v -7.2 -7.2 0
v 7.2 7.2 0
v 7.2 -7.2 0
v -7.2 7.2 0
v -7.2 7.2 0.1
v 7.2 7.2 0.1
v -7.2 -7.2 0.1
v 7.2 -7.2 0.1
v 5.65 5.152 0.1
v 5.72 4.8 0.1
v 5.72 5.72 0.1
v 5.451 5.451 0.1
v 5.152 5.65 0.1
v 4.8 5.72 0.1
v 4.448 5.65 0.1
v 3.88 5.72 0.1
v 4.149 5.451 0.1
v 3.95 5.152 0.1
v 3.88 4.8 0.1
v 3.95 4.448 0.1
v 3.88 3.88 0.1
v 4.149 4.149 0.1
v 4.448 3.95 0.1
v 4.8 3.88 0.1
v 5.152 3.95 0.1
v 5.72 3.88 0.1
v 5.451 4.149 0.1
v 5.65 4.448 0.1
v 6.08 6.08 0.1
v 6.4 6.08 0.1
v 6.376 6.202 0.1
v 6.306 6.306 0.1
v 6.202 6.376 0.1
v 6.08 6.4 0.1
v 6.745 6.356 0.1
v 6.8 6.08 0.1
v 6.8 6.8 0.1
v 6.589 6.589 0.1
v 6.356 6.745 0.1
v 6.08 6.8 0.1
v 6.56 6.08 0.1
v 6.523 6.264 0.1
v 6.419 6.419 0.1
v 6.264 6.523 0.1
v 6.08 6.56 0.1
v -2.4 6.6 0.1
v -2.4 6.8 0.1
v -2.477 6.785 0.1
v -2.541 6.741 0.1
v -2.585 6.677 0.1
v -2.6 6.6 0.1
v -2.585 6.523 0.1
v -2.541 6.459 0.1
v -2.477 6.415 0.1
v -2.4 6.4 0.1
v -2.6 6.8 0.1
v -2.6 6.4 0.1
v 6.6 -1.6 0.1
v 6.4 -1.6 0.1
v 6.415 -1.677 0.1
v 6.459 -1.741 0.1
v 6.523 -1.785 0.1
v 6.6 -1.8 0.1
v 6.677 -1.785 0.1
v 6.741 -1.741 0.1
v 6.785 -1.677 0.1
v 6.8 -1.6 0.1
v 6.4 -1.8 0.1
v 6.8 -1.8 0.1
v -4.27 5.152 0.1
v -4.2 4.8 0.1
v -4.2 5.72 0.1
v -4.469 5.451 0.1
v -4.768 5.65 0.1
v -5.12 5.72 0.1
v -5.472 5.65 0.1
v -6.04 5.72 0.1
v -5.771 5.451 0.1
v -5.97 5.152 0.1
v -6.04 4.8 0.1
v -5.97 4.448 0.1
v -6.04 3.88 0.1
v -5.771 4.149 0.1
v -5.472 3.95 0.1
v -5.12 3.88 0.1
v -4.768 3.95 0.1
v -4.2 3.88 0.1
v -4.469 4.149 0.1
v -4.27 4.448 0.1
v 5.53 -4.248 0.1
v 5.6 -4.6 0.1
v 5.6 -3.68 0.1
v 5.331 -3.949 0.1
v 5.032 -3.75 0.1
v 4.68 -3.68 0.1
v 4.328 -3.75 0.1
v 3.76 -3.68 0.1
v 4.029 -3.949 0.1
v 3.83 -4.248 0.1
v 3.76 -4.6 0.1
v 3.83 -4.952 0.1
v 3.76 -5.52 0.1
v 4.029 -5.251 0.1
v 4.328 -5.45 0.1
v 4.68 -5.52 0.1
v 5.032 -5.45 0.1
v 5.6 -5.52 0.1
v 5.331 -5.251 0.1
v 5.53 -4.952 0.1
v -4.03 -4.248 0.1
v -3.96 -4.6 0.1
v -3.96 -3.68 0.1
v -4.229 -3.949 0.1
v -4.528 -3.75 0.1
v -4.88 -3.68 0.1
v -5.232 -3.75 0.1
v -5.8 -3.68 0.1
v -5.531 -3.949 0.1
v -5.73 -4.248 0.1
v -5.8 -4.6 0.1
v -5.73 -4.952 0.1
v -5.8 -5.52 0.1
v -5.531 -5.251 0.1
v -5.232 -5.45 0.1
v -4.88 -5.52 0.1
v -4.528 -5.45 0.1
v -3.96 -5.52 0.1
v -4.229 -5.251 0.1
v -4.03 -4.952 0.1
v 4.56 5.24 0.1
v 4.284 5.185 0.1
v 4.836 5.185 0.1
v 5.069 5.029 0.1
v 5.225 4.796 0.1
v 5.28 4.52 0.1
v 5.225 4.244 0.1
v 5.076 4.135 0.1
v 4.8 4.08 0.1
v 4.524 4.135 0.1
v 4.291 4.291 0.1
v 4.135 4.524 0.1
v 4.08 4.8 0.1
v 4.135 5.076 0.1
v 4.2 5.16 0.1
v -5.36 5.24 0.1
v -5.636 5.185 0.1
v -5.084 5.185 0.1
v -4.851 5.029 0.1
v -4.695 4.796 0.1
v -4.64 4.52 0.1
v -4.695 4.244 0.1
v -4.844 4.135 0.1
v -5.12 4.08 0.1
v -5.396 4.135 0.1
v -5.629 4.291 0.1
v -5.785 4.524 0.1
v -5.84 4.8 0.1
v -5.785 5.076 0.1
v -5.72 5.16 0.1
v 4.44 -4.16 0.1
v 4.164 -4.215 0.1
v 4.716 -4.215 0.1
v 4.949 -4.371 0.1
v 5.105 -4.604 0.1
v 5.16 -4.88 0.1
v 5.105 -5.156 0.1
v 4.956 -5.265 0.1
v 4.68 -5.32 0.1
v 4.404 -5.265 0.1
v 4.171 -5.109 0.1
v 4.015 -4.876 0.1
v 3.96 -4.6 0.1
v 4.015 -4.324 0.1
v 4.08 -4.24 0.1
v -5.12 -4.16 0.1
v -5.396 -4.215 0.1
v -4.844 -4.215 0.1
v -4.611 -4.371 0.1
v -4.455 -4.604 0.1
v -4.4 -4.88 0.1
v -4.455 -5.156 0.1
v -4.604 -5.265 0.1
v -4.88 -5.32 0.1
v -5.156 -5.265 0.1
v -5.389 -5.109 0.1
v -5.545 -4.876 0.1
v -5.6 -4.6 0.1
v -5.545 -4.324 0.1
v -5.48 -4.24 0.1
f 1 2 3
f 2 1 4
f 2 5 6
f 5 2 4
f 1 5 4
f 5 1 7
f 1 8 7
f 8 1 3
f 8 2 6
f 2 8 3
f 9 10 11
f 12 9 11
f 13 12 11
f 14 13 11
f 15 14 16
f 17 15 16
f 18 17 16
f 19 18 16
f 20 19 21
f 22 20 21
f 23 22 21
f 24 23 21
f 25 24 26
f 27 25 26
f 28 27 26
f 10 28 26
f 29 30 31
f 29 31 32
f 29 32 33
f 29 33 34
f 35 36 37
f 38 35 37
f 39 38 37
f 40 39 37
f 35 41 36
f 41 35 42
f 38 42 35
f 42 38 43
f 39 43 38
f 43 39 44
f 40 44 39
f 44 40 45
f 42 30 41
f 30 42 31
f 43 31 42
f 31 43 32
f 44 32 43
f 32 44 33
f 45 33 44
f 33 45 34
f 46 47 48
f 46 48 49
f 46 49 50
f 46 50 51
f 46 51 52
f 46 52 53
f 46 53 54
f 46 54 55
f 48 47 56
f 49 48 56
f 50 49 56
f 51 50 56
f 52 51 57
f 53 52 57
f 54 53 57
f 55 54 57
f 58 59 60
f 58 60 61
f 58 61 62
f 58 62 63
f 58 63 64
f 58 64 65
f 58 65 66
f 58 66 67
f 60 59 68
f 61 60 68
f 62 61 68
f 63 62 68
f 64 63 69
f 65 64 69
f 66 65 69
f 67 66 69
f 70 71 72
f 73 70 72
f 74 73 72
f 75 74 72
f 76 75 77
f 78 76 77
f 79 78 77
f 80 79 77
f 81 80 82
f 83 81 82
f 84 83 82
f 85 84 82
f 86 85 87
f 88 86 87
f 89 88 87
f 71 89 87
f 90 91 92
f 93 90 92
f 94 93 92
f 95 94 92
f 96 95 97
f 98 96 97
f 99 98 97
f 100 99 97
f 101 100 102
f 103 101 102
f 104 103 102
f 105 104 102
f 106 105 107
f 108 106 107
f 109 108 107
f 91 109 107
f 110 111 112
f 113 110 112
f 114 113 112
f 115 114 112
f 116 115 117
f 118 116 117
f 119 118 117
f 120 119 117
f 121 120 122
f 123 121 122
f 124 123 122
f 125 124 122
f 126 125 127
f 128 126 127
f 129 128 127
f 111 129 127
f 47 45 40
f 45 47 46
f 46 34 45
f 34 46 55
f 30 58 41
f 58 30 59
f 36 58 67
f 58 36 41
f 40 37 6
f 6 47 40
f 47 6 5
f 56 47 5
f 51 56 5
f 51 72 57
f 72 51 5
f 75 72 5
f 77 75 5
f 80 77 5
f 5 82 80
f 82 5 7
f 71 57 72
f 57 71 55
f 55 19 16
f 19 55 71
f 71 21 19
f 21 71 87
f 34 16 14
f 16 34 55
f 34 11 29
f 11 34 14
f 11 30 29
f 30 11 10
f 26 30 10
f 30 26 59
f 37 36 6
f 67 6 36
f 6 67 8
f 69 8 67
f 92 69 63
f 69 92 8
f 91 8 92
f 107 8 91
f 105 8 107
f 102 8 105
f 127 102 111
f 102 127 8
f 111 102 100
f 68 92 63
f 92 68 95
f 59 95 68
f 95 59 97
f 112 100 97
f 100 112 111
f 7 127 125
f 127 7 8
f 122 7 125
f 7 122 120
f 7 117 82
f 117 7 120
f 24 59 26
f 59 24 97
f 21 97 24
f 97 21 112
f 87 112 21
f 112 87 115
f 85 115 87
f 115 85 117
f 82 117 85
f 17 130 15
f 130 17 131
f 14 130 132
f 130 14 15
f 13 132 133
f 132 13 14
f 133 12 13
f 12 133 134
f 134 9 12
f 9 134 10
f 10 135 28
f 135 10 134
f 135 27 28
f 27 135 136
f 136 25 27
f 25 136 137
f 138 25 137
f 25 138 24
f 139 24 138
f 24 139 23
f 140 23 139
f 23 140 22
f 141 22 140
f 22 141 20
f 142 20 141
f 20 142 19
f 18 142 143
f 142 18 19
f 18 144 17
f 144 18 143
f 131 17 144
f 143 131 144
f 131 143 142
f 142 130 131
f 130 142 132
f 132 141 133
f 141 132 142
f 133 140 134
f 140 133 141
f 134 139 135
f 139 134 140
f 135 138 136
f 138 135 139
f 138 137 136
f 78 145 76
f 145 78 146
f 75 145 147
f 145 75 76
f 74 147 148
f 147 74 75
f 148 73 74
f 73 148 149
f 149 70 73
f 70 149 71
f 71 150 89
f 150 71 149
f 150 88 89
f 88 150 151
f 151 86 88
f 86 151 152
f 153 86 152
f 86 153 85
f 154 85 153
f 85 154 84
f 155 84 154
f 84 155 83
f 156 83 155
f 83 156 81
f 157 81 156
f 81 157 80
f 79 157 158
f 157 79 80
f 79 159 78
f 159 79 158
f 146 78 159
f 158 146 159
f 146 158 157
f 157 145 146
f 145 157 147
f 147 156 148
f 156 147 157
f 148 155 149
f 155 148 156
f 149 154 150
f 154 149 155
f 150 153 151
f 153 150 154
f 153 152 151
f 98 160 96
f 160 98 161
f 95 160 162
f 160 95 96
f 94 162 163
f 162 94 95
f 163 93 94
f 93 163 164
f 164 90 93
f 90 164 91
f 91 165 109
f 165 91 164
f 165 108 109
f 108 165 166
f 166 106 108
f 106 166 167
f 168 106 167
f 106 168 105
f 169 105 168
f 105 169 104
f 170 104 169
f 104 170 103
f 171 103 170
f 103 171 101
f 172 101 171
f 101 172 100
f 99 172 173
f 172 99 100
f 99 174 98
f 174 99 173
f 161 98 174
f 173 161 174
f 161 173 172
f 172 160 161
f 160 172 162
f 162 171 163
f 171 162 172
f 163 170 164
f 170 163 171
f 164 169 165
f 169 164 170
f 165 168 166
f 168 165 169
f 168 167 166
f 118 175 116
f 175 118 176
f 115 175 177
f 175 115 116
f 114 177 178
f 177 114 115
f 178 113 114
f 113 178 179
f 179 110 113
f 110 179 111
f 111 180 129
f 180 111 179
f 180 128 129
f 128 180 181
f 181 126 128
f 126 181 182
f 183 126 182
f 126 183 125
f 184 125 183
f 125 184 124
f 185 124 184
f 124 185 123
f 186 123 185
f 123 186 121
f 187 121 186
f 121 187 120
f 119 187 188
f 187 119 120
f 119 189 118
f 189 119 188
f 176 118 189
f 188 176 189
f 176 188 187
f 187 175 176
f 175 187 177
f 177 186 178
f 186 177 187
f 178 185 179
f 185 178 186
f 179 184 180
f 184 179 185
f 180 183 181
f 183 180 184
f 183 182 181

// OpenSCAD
// file: ../p/box5-12.scad
use <../lib.scad>
function ldraw_lib__box5_12() = [
// 0 Box with 5 Faces without Any Edges
// 0 Name: box5-12.dat
// 0 Author: Chris Dee [cwdee]
// 0 !LDRAW_ORG Primitive UPDATE 2009-02
// 0 !LICENSE Licensed under CC BY 2.0 and CC BY 4.0 : see CAreadme.txt
// 
// 0 BFC CERTIFY CCW
  [0,"BFC","CERTIFY"],
  [0,"BFC","CCW"],
// 
// 0 !HISTORY 2009-09-03 [PTadmin] Official Update 2009-02
// 
// 
// 4 16 1 1 1 1 1 -1 -1 1 -1 -1 1 1
  [4,16,1,1,1,1,1,-1,-1,1,-1,-1,1,1],
// 4 16 -1 0 1 1 0 1 1 1 1 -1 1 1
  [4,16,-1,0,1,1,0,1,1,1,1,-1,1,1],
// 4 16 -1 0 -1 -1 0 1 -1 1 1 -1 1 -1
  [4,16,-1,0,-1,-1,0,1,-1,1,1,-1,1,-1],
// 4 16 1 0 -1 -1 0 -1 -1 1 -1 1 1 -1
  [4,16,1,0,-1,-1,0,-1,-1,1,-1,1,1,-1],
// 4 16 1 0 1 1 0 -1 1 1 -1 1 1 1
  [4,16,1,0,1,1,0,-1,1,1,-1,1,1,1],
// 0
];
makepoly(ldraw_lib__box5_12(), line=0.2);
// file: ../p/4-4ndis.scad
use <../lib.scad>
function ldraw_lib__4_4ndis() = [
// 0 Disc Negative 1.0
// 0 Name: 4-4ndis.dat
// 0 Author: James Jessiman
// 0 !LDRAW_ORG Primitive UPDATE 2012-01
// 0 !LICENSE Licensed under CC BY 2.0 and CC BY 4.0 : see CAreadme.txt
// 
// 0 BFC CERTIFY CCW
  [0,"BFC","CERTIFY"],
  [0,"BFC","CCW"],
// 
// 0 !HISTORY 2002-03-23 [sbliss] Added BFC statement; compacted code
// 0 !HISTORY 2002-04-25 [PTadmin] Official Update 2002-02
// 0 !HISTORY 2007-06-24 [PTadmin] Header formatted for Contributor Agreement
// 0 !HISTORY 2008-07-01 [PTadmin] Official Update 2008-01
// 0 !HISTORY 2012-02-16 [Philo] Changed to CCW
// 0 !HISTORY 2012-03-30 [PTadmin] Official Update 2012-01
// 
// 
// 3 16 0.9239 0 0.3827 1 0 0 1 0 1
  [3,16,0.9239,0,0.3827,1,0,0,1,0,1],
// 3 16 0.7071 0 0.7071 0.9239 0 0.3827 1 0 1
  [3,16,0.7071,0,0.7071,0.9239,0,0.3827,1,0,1],
// 3 16 0.3827 0 0.9239 0.7071 0 0.7071 1 0 1
  [3,16,0.3827,0,0.9239,0.7071,0,0.7071,1,0,1],
// 3 16 0 0 1 0.3827 0 0.9239 1 0 1
  [3,16,0,0,1,0.3827,0,0.9239,1,0,1],
// 3 16 -0.3827 0 0.9239 0 0 1 -1 0 1
  [3,16,-0.3827,0,0.9239,0,0,1,-1,0,1],
// 3 16 -0.7071 0 0.7071 -0.3827 0 0.9239 -1 0 1
  [3,16,-0.7071,0,0.7071,-0.3827,0,0.9239,-1,0,1],
// 3 16 -0.9239 0 0.3827 -0.7071 0 0.7071 -1 0 1
  [3,16,-0.9239,0,0.3827,-0.7071,0,0.7071,-1,0,1],
// 3 16 -1 0 0 -0.9239 0 0.3827 -1 0 1
  [3,16,-1,0,0,-0.9239,0,0.3827,-1,0,1],
// 3 16 -0.9239 0 -0.3827 -1 0 0 -1 0 -1
  [3,16,-0.9239,0,-0.3827,-1,0,0,-1,0,-1],
// 3 16 -0.7071 0 -0.7071 -0.9239 0 -0.3827 -1 0 -1
  [3,16,-0.7071,0,-0.7071,-0.9239,0,-0.3827,-1,0,-1],
// 3 16 -0.3827 0 -0.9239 -0.7071 0 -0.7071 -1 0 -1
  [3,16,-0.3827,0,-0.9239,-0.7071,0,-0.7071,-1,0,-1],
// 3 16 0 0 -1 -0.3827 0 -0.9239 -1 0 -1
  [3,16,0,0,-1,-0.3827,0,-0.9239,-1,0,-1],
// 3 16 0.3827 0 -0.9239 0 0 -1 1 0 -1
  [3,16,0.3827,0,-0.9239,0,0,-1,1,0,-1],
// 3 16 0.7071 0 -0.7071 0.3827 0 -0.9239 1 0 -1
  [3,16,0.7071,0,-0.7071,0.3827,0,-0.9239,1,0,-1],
// 3 16 0.9239 0 -0.3827 0.7071 0 -0.7071 1 0 -1
  [3,16,0.9239,0,-0.3827,0.7071,0,-0.7071,1,0,-1],
// 3 16 1 0 0 0.9239 0 -0.3827 1 0 -1
  [3,16,1,0,0,0.9239,0,-0.3827,1,0,-1],
];
makepoly(ldraw_lib__4_4ndis(), line=0.2);
// file: ../p/2-4ndis.scad
use <../lib.scad>
function ldraw_lib__2_4ndis() = [
// 0 Disc Negative 0.5
// 0 Name: 2-4ndis.dat
// 0 Author: James Jessiman
// 0 !LDRAW_ORG Primitive UPDATE 2012-01
// 0 !LICENSE Licensed under CC BY 2.0 and CC BY 4.0 : see CAreadme.txt
// 
// 0 BFC CERTIFY CCW
  [0,"BFC","CERTIFY"],
  [0,"BFC","CCW"],
// 
// 0 !HISTORY 2002-03-23 [sbliss] Added BFC statement; compacted code
// 0 !HISTORY 2002-04-25 [PTadmin] Official Update 2002-02
// 0 !HISTORY 2007-06-24 [PTadmin] Header formatted for Contributor Agreement
// 0 !HISTORY 2008-07-01 [PTadmin] Official Update 2008-01
// 0 !HISTORY 2012-02-16 [Philo] Changed to CCW
// 0 !HISTORY 2012-03-30 [PTadmin] Official Update 2012-01
// 
// 
// 3 16 0.9239 0 0.3827 1 0 0 1 0 1
  [3,16,0.9239,0,0.3827,1,0,0,1,0,1],
// 3 16 0.7071 0 0.7071 0.9239 0 0.3827 1 0 1
  [3,16,0.7071,0,0.7071,0.9239,0,0.3827,1,0,1],
// 3 16 0.3827 0 0.9239 0.7071 0 0.7071 1 0 1
  [3,16,0.3827,0,0.9239,0.7071,0,0.7071,1,0,1],
// 3 16 0 0 1 0.3827 0 0.9239 1 0 1
  [3,16,0,0,1,0.3827,0,0.9239,1,0,1],
// 3 16 -0.3827 0 0.9239 0 0 1 -1 0 1
  [3,16,-0.3827,0,0.9239,0,0,1,-1,0,1],
// 3 16 -0.7071 0 0.7071 -0.3827 0 0.9239 -1 0 1
  [3,16,-0.7071,0,0.7071,-0.3827,0,0.9239,-1,0,1],
// 3 16 -0.9239 0 0.3827 -0.7071 0 0.7071 -1 0 1
  [3,16,-0.9239,0,0.3827,-0.7071,0,0.7071,-1,0,1],
// 3 16 -1 0 0 -0.9239 0 0.3827 -1 0 1
  [3,16,-1,0,0,-0.9239,0,0.3827,-1,0,1],
];
makepoly(ldraw_lib__2_4ndis(), line=0.2);
// file: ../p/2-4disc.scad
use <../lib.scad>
function ldraw_lib__2_4disc() = [
// 0 Disc 0.5
// 0 Name: 2-4disc.dat
// 0 Author: James Jessiman
// 0 !LDRAW_ORG Primitive UPDATE 2002-02
// 0 !LICENSE Licensed under CC BY 2.0 and CC BY 4.0 : see CAreadme.txt
// 
// 0 BFC CERTIFY CCW
  [0,"BFC","CERTIFY"],
  [0,"BFC","CCW"],
// 
// 0 !HISTORY 1998-12-15 [PTadmin] Official Update 1998-10
// 0 !HISTORY 2002-03-23 [sbliss] Added BFC statement
// 0 !HISTORY 2002-04-25 [PTadmin] Official Update 2002-02
// 0 !HISTORY 2007-06-24 [PTadmin] Header formatted for Contributor Agreement
// 0 !HISTORY 2008-07-01 [PTadmin] Official Update 2008-01
// 
// 
// 3 16 0 0 0 1 0 0 0.9239 0 0.3827
  [3,16,0,0,0,1,0,0,0.9239,0,0.3827],
// 3 16 0 0 0 0.9239 0 0.3827 0.7071 0 0.7071
  [3,16,0,0,0,0.9239,0,0.3827,0.7071,0,0.7071],
// 3 16 0 0 0 0.7071 0 0.7071 0.3827 0 0.9239
  [3,16,0,0,0,0.7071,0,0.7071,0.3827,0,0.9239],
// 3 16 0 0 0 0.3827 0 0.9239 0 0 1
  [3,16,0,0,0,0.3827,0,0.9239,0,0,1],
// 3 16 0 0 0 0 0 1 -0.3827 0 0.9239
  [3,16,0,0,0,0,0,1,-0.3827,0,0.9239],
// 3 16 0 0 0 -0.3827 0 0.9239 -0.7071 0 0.7071
  [3,16,0,0,0,-0.3827,0,0.9239,-0.7071,0,0.7071],
// 3 16 0 0 0 -0.7071 0 0.7071 -0.9239 0 0.3827
  [3,16,0,0,0,-0.7071,0,0.7071,-0.9239,0,0.3827],
// 3 16 0 0 0 -0.9239 0 0.3827 -1 0 -0
  [3,16,0,0,0,-0.9239,0,0.3827,-1,0,-0],
// 0
];
makepoly(ldraw_lib__2_4disc(), line=0.2);
// file: ../p/1-4ring2.scad
use <../lib.scad>
function ldraw_lib__1_4ring2() = [
// 0 Ring  2 x 0.25
// 0 Name: 1-4ring2.dat
// 0 Author: Franklin W. Cain [fwcain]
// 0 !LDRAW_ORG Primitive UPDATE 2015-01
// 0 !LICENSE Licensed under CC BY 2.0 and CC BY 4.0 : see CAreadme.txt
// 
// 0 BFC CERTIFY CCW
  [0,"BFC","CERTIFY"],
  [0,"BFC","CCW"],
// 
// 0 !HISTORY 2001-12-31 [PTadmin] Official Update 2001-03
// 0 !HISTORY 2007-06-22 [PTadmin] Header formatted for Contributor Agreement
// 0 !HISTORY 2008-07-01 [PTadmin] Official Update 2008-01
// 0 !HISTORY 2012-02-16 [Philo] Changed to CCW
// 0 !HISTORY 2012-03-30 [PTadmin] Official Update 2012-01
// 0 !HISTORY 2014-12-25 [MMR1988] Fixed a rounding issue
// 0 !HISTORY 2015-10-11 [PTadmin] Official Update 2015-01
// 
// 
// 4 16 3 0 0 2.7717 0 1.1481 1.8478 0 0.7654 2 0 0
  [4,16,3,0,0,2.7717,0,1.1481,1.8478,0,0.7654,2,0,0],
// 4 16 2.7717 0 1.1481 2.1213 0 2.1213 1.4142 0 1.4142 1.8478 0 0.7654
  [4,16,2.7717,0,1.1481,2.1213,0,2.1213,1.4142,0,1.4142,1.8478,0,0.7654],
// 4 16 2.1213 0 2.1213 1.1481 0 2.7717 0.7654 0 1.8478 1.4142 0 1.4142
  [4,16,2.1213,0,2.1213,1.1481,0,2.7717,0.7654,0,1.8478,1.4142,0,1.4142],
// 4 16 1.1481 0 2.7717 0 0 3 0 0 2 0.7654 0 1.8478
  [4,16,1.1481,0,2.7717,0,0,3,0,0,2,0.7654,0,1.8478],
// 0 // Build by Primitive Generator 2
];
makepoly(ldraw_lib__1_4ring2(), line=0.2);
// file: ../p/1-4ndis.scad
use <../lib.scad>
function ldraw_lib__1_4ndis() = [
// 0 Disc Negative 0.25
// 0 Name: 1-4ndis.dat
// 0 Author: James Jessiman
// 0 !LDRAW_ORG Primitive UPDATE 2012-01
// 0 !LICENSE Licensed under CC BY 2.0 and CC BY 4.0 : see CAreadme.txt
// 
// 0 BFC CERTIFY CCW
  [0,"BFC","CERTIFY"],
  [0,"BFC","CCW"],
// 
// 0 !HISTORY 2002-03-23 [sbliss] Added BFC Statement
// 0 !HISTORY 2002-04-25 [PTadmin] Official Update 2002-02
// 0 !HISTORY 2007-06-22 [PTadmin] Header formatted for Contributor Agreement
// 0 !HISTORY 2008-07-01 [PTadmin] Official Update 2008-01
// 0 !HISTORY 2012-02-16 [Philo] Changed to CCW
// 0 !HISTORY 2012-03-30 [PTadmin] Official Update 2012-01
// 
// 
// 3 16 0.9239 0 0.3827 1 0 0 1 0 1
  [3,16,0.9239,0,0.3827,1,0,0,1,0,1],
// 3 16 0.7071 0 0.7071 0.9239 0 0.3827 1 0 1
  [3,16,0.7071,0,0.7071,0.9239,0,0.3827,1,0,1],
// 3 16 0.3827 0 0.9239 0.7071 0 0.7071 1 0 1
  [3,16,0.3827,0,0.9239,0.7071,0,0.7071,1,0,1],
// 3 16 0 0 1 0.3827 0 0.9239 1 0 1
  [3,16,0,0,1,0.3827,0,0.9239,1,0,1],
];
makepoly(ldraw_lib__1_4ndis(), line=0.2);
// file: ../p/1-4disc.scad
use <../lib.scad>
function ldraw_lib__1_4disc() = [
// 0 Disc 0.25
// 0 Name: 1-4disc.dat
// 0 Author: James Jessiman
// 0 !LDRAW_ORG Primitive UPDATE 2002-02
// 0 !LICENSE Licensed under CC BY 2.0 and CC BY 4.0 : see CAreadme.txt
// 
// 0 BFC CERTIFY CCW
  [0,"BFC","CERTIFY"],
  [0,"BFC","CCW"],
// 
// 0 !HISTORY 2002-03-23 [sbliss] Added BFC statement.
// 0 !HISTORY 2002-04-25 [PTadmin] Official Update 2002-02
// 0 !HISTORY 2007-06-22 [PTadmin] Header formatted for Contributor Agreement
// 0 !HISTORY 2008-07-01 [PTadmin] Official Update 2008-01
// 
// 
// 3 16 0 0 0 1 0 0 0.9239 0 0.3827
  [3,16,0,0,0,1,0,0,0.9239,0,0.3827],
// 3 16 0 0 0 0.9239 0 0.3827 0.7071 0 0.7071
  [3,16,0,0,0,0.9239,0,0.3827,0.7071,0,0.7071],
// 3 16 0 0 0 0.7071 0 0.7071 0.3827 0 0.9239
  [3,16,0,0,0,0.7071,0,0.7071,0.3827,0,0.9239],
// 3 16 0 0 0 0.3827 0 0.9239 0 0 1
  [3,16,0,0,0,0.3827,0,0.9239,0,0,1],
// 0
];
makepoly(ldraw_lib__1_4disc(), line=0.2);
// main file
use <../lib.scad>
use <../p/1-4disc.scad>
use <../p/1-4ndis.scad>
use <../p/1-4ring2.scad>
use <../p/2-4disc.scad>
use <../p/2-4ndis.scad>
use <../p/4-4ndis.scad>
use <../p/box5-12.scad>
function ldraw_lib__4544258l() = [
// 0 Sticker  1.8 x  1.8 with Four Rivets
// 0 Name: 4544258l.dat
// 0 Author: J.C. Tchang [tchang]
// 0 !LDRAW_ORG Part UPDATE 2012-03
// 0 !LICENSE Licensed under CC BY 2.0 and CC BY 4.0 : see CAreadme.txt
// 
// 0 BFC CERTIFY CCW
  [0,"BFC","CERTIFY"],
  [0,"BFC","CCW"],
// 
// 0 !KEYWORDS Emerald Night, set 10194, Train
// 
// 0 !HISTORY 2012-12-28 [PTadmin] Official Update 2012-03
// 
// 
// 1 16 0 -0.25 0 18 0 0 0 0.25 0 0 0 18 box5-12.dat
  [1,16,0,-0.25,0,18,0,0,0,0.25,0,0,0,18, ldraw_lib__box5_12()],
// 0 //
// 1 16 12 -0.25 12 2.3 0 0 0 1 0 0 0 2.3 4-4ndis.dat
  [1,16,12,-0.25,12,2.3,0,0,0,1,0,0,0,2.3, ldraw_lib__4_4ndis()],
// 1 16 15.2 -0.25 15.2 0.8 0 0 0 1 0 0 0 0.8 1-4disc.dat
  [1,16,15.2,-0.25,15.2,0.8,0,0,0,1,0,0,0,0.8, ldraw_lib__1_4disc()],
// 1 16 15.2 -0.25 15.2 1.8 0 0 0 1 0 0 0 1.8 1-4ndis.dat
  [1,16,15.2,-0.25,15.2,1.8,0,0,0,1,0,0,0,1.8, ldraw_lib__1_4ndis()],
// 1 15 15.2 -0.25 15.2 0.6 0 0 0 1 0 0 0 0.6 1-4ring2.dat
  [1,15,15.2,-0.25,15.2,0.6,0,0,0,1,0,0,0,0.6, ldraw_lib__1_4ring2()],
// 1 15 15.2 -0.25 15.2 0.4 0 0 0 1 0 0 0 0.4 1-4ring2.dat
  [1,15,15.2,-0.25,15.2,0.4,0,0,0,1,0,0,0,0.4, ldraw_lib__1_4ring2()],
// 1 15 -6 -0.25 16.5 0 0 -0.5 0 1 0 0.5 0 0 2-4disc.dat
  [1,15,-6,-0.25,16.5,0,0,-0.5,0,1,0,0.5,0,0, ldraw_lib__2_4disc()],
// 1 16 -6 -0.25 16.5 0 0 -0.5 0 1 0 0.5 0 0 2-4ndis.dat
  [1,16,-6,-0.25,16.5,0,0,-0.5,0,1,0,0.5,0,0, ldraw_lib__2_4ndis()],
// 1 15 16.5 -0.25 -4 -0.5 0 0 0 1 0 0 0 -0.5 2-4disc.dat
  [1,15,16.5,-0.25,-4,-0.5,0,0,0,1,0,0,0,-0.5, ldraw_lib__2_4disc()],
// 1 16 16.5 -0.25 -4 -0.5 0 0 0 1 0 0 0 -0.5 2-4ndis.dat
  [1,16,16.5,-0.25,-4,-0.5,0,0,0,1,0,0,0,-0.5, ldraw_lib__2_4ndis()],
// 1 16 -12.8 -0.25 12 2.3 0 0 0 1 0 0 0 2.3 4-4ndis.dat
  [1,16,-12.8,-0.25,12,2.3,0,0,0,1,0,0,0,2.3, ldraw_lib__4_4ndis()],
// 1 16 11.7 -0.25 -11.5 2.3 0 0 0 1 0 0 0 2.3 4-4ndis.dat
  [1,16,11.7,-0.25,-11.5,2.3,0,0,0,1,0,0,0,2.3, ldraw_lib__4_4ndis()],
// 1 16 -12.2 -0.25 -11.5 2.3 0 0 0 1 0 0 0 2.3 4-4ndis.dat
  [1,16,-12.2,-0.25,-11.5,2.3,0,0,0,1,0,0,0,2.3, ldraw_lib__4_4ndis()],
// 4 15 15.2 -0.25 17 -6 -0.25 17 -6 -0.25 16.5 15.2 -0.25 16.4
  [4,15,15.2,-0.25,17,-6,-0.25,17,-6,-0.25,16.5,15.2,-0.25,16.4],
// 4 15 15.2 -0.25 16.4 -6 -0.25 16.5 -6 -0.25 16 15.2 -0.25 16
  [4,15,15.2,-0.25,16.4,-6,-0.25,16.5,-6,-0.25,16,15.2,-0.25,16],
// 4 15 16 -0.25 15.2 16 -0.25 -4 16.5 -0.25 -4 16.4 -0.25 15.2
  [4,15,16,-0.25,15.2,16,-0.25,-4,16.5,-0.25,-4,16.4,-0.25,15.2],
// 4 15 17 -0.25 15.2 16.4 -0.25 15.2 16.5 -0.25 -4 17 -0.25 -4
  [4,15,17,-0.25,15.2,16.4,-0.25,15.2,16.5,-0.25,-4,17,-0.25,-4],
// 3 16 15.2 -0.25 17 17 -0.25 17 18 -0.25 18
  [3,16,15.2,-0.25,17,17,-0.25,17,18,-0.25,18],
// 4 16 -6 -0.25 17 15.2 -0.25 17 18 -0.25 18 -18 -0.25 18
  [4,16,-6,-0.25,17,15.2,-0.25,17,18,-0.25,18,-18,-0.25,18],
// 3 16 -6.5 -0.25 17 -6 -0.25 17 -18 -0.25 18
  [3,16,-6.5,-0.25,17,-6,-0.25,17,-18,-0.25,18],
// 3 16 -6.5 -0.25 16.5 -6.5 -0.25 17 -18 -0.25 18
  [3,16,-6.5,-0.25,16.5,-6.5,-0.25,17,-18,-0.25,18],
// 4 16 -6.5 -0.25 16 -6.5 -0.25 16.5 -18 -0.25 18 -10.5 -0.25 14.3
  [4,16,-6.5,-0.25,16,-6.5,-0.25,16.5,-18,-0.25,18,-10.5,-0.25,14.3],
// 3 16 -12.8 -0.25 14.3 -10.5 -0.25 14.3 -18 -0.25 18
  [3,16,-12.8,-0.25,14.3,-10.5,-0.25,14.3,-18,-0.25,18],
// 3 16 -15.1 -0.25 14.3 -12.8 -0.25 14.3 -18 -0.25 18
  [3,16,-15.1,-0.25,14.3,-12.8,-0.25,14.3,-18,-0.25,18],
// 3 16 -15.1 -0.25 12 -15.1 -0.25 14.3 -18 -0.25 18
  [3,16,-15.1,-0.25,12,-15.1,-0.25,14.3,-18,-0.25,18],
// 4 16 -15.1 -0.25 9.7 -15.1 -0.25 12 -18 -0.25 18 -18 -0.25 -18
  [4,16,-15.1,-0.25,9.7,-15.1,-0.25,12,-18,-0.25,18,-18,-0.25,-18],
// 4 16 -6 -0.25 16 -6.5 -0.25 16 -10.5 -0.25 14.3 -10.5 -0.25 12
  [4,16,-6,-0.25,16,-6.5,-0.25,16,-10.5,-0.25,14.3,-10.5,-0.25,12],
// 4 16 9.7 -0.25 14.3 -6 -0.25 16 -10.5 -0.25 12 9.7 -0.25 12
  [4,16,9.7,-0.25,14.3,-6,-0.25,16,-10.5,-0.25,12,9.7,-0.25,12],
// 4 16 9.7 -0.25 12 -10.5 -0.25 12 -10.5 -0.25 9.7 9.7 -0.25 9.7
  [4,16,9.7,-0.25,12,-10.5,-0.25,12,-10.5,-0.25,9.7,9.7,-0.25,9.7],
// 4 16 15.2 -0.25 16 -6 -0.25 16 9.7 -0.25 14.3 12 -0.25 14.3
  [4,16,15.2,-0.25,16,-6,-0.25,16,9.7,-0.25,14.3,12,-0.25,14.3],
// 4 16 15.2 -0.25 15.2 15.2 -0.25 16 12 -0.25 14.3 14.3 -0.25 14.3
  [4,16,15.2,-0.25,15.2,15.2,-0.25,16,12,-0.25,14.3,14.3,-0.25,14.3],
// 4 16 16 -0.25 15.2 15.2 -0.25 15.2 14.3 -0.25 14.3 14.3 -0.25 12
  [4,16,16,-0.25,15.2,15.2,-0.25,15.2,14.3,-0.25,14.3,14.3,-0.25,12],
// 4 16 16 -0.25 15.2 14.3 -0.25 12 14.3 -0.25 9.7 16 -0.25 -4
  [4,16,16,-0.25,15.2,14.3,-0.25,12,14.3,-0.25,9.7,16,-0.25,-4],
// 3 16 17 -0.25 17 17 -0.25 15.2 18 -0.25 18
  [3,16,17,-0.25,17,17,-0.25,15.2,18,-0.25,18],
// 4 16 18 -0.25 18 17 -0.25 15.2 17 -0.25 -4 18 -0.25 -18
  [4,16,18,-0.25,18,17,-0.25,15.2,17,-0.25,-4,18,-0.25,-18],
// 3 16 17 -0.25 -4.5 18 -0.25 -18 17 -0.25 -4
  [3,16,17,-0.25,-4.5,18,-0.25,-18,17,-0.25,-4],
// 4 16 17 -0.25 -4.5 16.5 -0.25 -4.5 14 -0.25 -9.2 18 -0.25 -18
  [4,16,17,-0.25,-4.5,16.5,-0.25,-4.5,14,-0.25,-9.2,18,-0.25,-18],
// 3 16 14 -0.25 -11.5 18 -0.25 -18 14 -0.25 -9.2
  [3,16,14,-0.25,-11.5,18,-0.25,-18,14,-0.25,-9.2],
// 3 16 14 -0.25 -13.8 18 -0.25 -18 14 -0.25 -11.5
  [3,16,14,-0.25,-13.8,18,-0.25,-18,14,-0.25,-11.5],
// 3 16 11.7 -0.25 -13.8 18 -0.25 -18 14 -0.25 -13.8
  [3,16,11.7,-0.25,-13.8,18,-0.25,-18,14,-0.25,-13.8],
// 3 16 9.4 -0.25 -13.8 18 -0.25 -18 11.7 -0.25 -13.8
  [3,16,9.4,-0.25,-13.8,18,-0.25,-18,11.7,-0.25,-13.8],
// 4 16 -9.9 -0.25 -13.8 18 -0.25 -18 9.4 -0.25 -13.8 -9.9 -0.25 -11.5
  [4,16,-9.9,-0.25,-13.8,18,-0.25,-18,9.4,-0.25,-13.8,-9.9,-0.25,-11.5],
// 3 16 -9.9 -0.25 -11.5 9.4 -0.25 -13.8 9.4 -0.25 -11.5
  [3,16,-9.9,-0.25,-11.5,9.4,-0.25,-13.8,9.4,-0.25,-11.5],
// 4 16 14 -0.25 -9.2 16.5 -0.25 -4.5 16 -0.25 -4.5 11.7 -0.25 -9.2
  [4,16,14,-0.25,-9.2,16.5,-0.25,-4.5,16,-0.25,-4.5,11.7,-0.25,-9.2],
// 4 16 11.7 -0.25 -9.2 16 -0.25 -4.5 16 -0.25 -4 9.4 -0.25 -9.2
  [4,16,11.7,-0.25,-9.2,16,-0.25,-4.5,16,-0.25,-4,9.4,-0.25,-9.2],
// 4 16 -9.9 -0.25 -11.5 9.4 -0.25 -11.5 9.4 -0.25 -9.2 -9.9 -0.25 -9.2
  [4,16,-9.9,-0.25,-11.5,9.4,-0.25,-11.5,9.4,-0.25,-9.2,-9.9,-0.25,-9.2],
// 4 16 -18 -0.25 -18 18 -0.25 -18 -9.9 -0.25 -13.8 -12.2 -0.25 -13.8
  [4,16,-18,-0.25,-18,18,-0.25,-18,-9.9,-0.25,-13.8,-12.2,-0.25,-13.8],
// 3 16 -14.5 -0.25 -13.8 -18 -0.25 -18 -12.2 -0.25 -13.8
  [3,16,-14.5,-0.25,-13.8,-18,-0.25,-18,-12.2,-0.25,-13.8],
// 3 16 -18 -0.25 -18 -14.5 -0.25 -13.8 -14.5 -0.25 -11.5
  [3,16,-18,-0.25,-18,-14.5,-0.25,-13.8,-14.5,-0.25,-11.5],
// 4 16 -18 -0.25 -18 -14.5 -0.25 -11.5 -14.5 -0.25 -9.2 -15.1 -0.25 9.7
  [4,16,-18,-0.25,-18,-14.5,-0.25,-11.5,-14.5,-0.25,-9.2,-15.1,-0.25,9.7],
// 4 16 9.4 -0.25 -9.2 16 -0.25 -4 14.3 -0.25 9.7 12 -0.25 9.7
  [4,16,9.4,-0.25,-9.2,16,-0.25,-4,14.3,-0.25,9.7,12,-0.25,9.7],
// 4 16 -9.9 -0.25 -9.2 9.4 -0.25 -9.2 12 -0.25 9.7 9.7 -0.25 9.7
  [4,16,-9.9,-0.25,-9.2,9.4,-0.25,-9.2,12,-0.25,9.7,9.7,-0.25,9.7],
// 4 16 -9.9 -0.25 -9.2 9.7 -0.25 9.7 -10.5 -0.25 9.7 -12.2 -0.25 -9.2
  [4,16,-9.9,-0.25,-9.2,9.7,-0.25,9.7,-10.5,-0.25,9.7,-12.2,-0.25,-9.2],
// 4 16 -12.2 -0.25 -9.2 -10.5 -0.25 9.7 -12.8 -0.25 9.7 -14.5 -0.25 -9.2
  [4,16,-12.2,-0.25,-9.2,-10.5,-0.25,9.7,-12.8,-0.25,9.7,-14.5,-0.25,-9.2],
// 3 16 -15.1 -0.25 9.7 -14.5 -0.25 -9.2 -12.8 -0.25 9.7
  [3,16,-15.1,-0.25,9.7,-14.5,-0.25,-9.2,-12.8,-0.25,9.7],
// 0 //
// 4 15 10.3737 -0.25 13.6263 10.7112 -0.25 12.963 11.4 -0.25 13.1 11.1198 -0.25 14.125
  [4,15,10.3737,-0.25,13.6263,10.7112,-0.25,12.963,11.4,-0.25,13.1,11.1198,-0.25,14.125],
// 4 15 11.1198 -0.25 14.125 11.4 -0.25 13.1 12.0888 -0.25 12.963 12 -0.25 14.3
  [4,15,11.1198,-0.25,14.125,11.4,-0.25,13.1,12.0888,-0.25,12.963,12,-0.25,14.3],
// 4 15 12 -0.25 14.3 12.0888 -0.25 12.963 12.6728 -0.25 12.5728 12.8802 -0.25 14.125
  [4,15,12,-0.25,14.3,12.0888,-0.25,12.963,12.6728,-0.25,12.5728,12.8802,-0.25,14.125],
// 4 15 12.8802 -0.25 14.125 12.6728 -0.25 12.5728 13.063 -0.25 11.9888 13.6263 -0.25 13.6263
  [4,15,12.8802,-0.25,14.125,12.6728,-0.25,12.5728,13.063,-0.25,11.9888,13.6263,-0.25,13.6263],
// 4 15 14.125 -0.25 12.8802 13.6263 -0.25 13.6263 13.063 -0.25 11.9888 14.3 -0.25 12
  [4,15,14.125,-0.25,12.8802,13.6263,-0.25,13.6263,13.063,-0.25,11.9888,14.3,-0.25,12],
// 4 15 14.3 -0.25 12 13.063 -0.25 11.9888 13.2 -0.25 11.3 14.125 -0.25 11.1198
  [4,15,14.3,-0.25,12,13.063,-0.25,11.9888,13.2,-0.25,11.3,14.125,-0.25,11.1198],
// 4 15 14.125 -0.25 11.1198 13.2 -0.25 11.3 13.063 -0.25 10.6112 13.6263 -0.25 10.3737
  [4,15,14.125,-0.25,11.1198,13.2,-0.25,11.3,13.063,-0.25,10.6112,13.6263,-0.25,10.3737],
// 4 15 13.6263 -0.25 10.3737 13.063 -0.25 10.6112 12.6888 -0.25 10.337 12.8802 -0.25 9.87503
  [4,15,13.6263,-0.25,10.3737,13.063,-0.25,10.6112,12.6888,-0.25,10.337,12.8802,-0.25,9.87503],
// 4 15 12.8802 -0.25 9.87503 12.6888 -0.25 10.337 12 -0.25 10.2 12 -0.25 9.7
  [4,15,12.8802,-0.25,9.87503,12.6888,-0.25,10.337,12,-0.25,10.2,12,-0.25,9.7],
// 4 15 12 -0.25 9.7 12 -0.25 10.2 11.3112 -0.25 10.337 11.1198 -0.25 9.87503
  [4,15,12,-0.25,9.7,12,-0.25,10.2,11.3112,-0.25,10.337,11.1198,-0.25,9.87503],
// 4 15 11.1198 -0.25 9.87503 11.3112 -0.25 10.337 10.7272 -0.25 10.7272 10.3737 -0.25 10.3737
  [4,15,11.1198,-0.25,9.87503,11.3112,-0.25,10.337,10.7272,-0.25,10.7272,10.3737,-0.25,10.3737],
// 4 15 10.3737 -0.25 10.3737 10.7272 -0.25 10.7272 10.337 -0.25 11.3112 9.87503 -0.25 11.1198
  [4,15,10.3737,-0.25,10.3737,10.7272,-0.25,10.7272,10.337,-0.25,11.3112,9.87503,-0.25,11.1198],
// 4 15 9.87503 -0.25 11.1198 10.337 -0.25 11.3112 10.2 -0.25 12 9.7 -0.25 12
  [4,15,9.87503,-0.25,11.1198,10.337,-0.25,11.3112,10.2,-0.25,12,9.7,-0.25,12],
// 4 15 9.7 -0.25 12 10.2 -0.25 12 10.337 -0.25 12.6888 9.87503 -0.25 12.8802
  [4,15,9.7,-0.25,12,10.2,-0.25,12,10.337,-0.25,12.6888,9.87503,-0.25,12.8802],
// 4 15 9.87503 -0.25 12.8802 10.337 -0.25 12.6888 10.5 -0.25 12.9 10.3737 -0.25 13.6263
  [4,15,9.87503,-0.25,12.8802,10.337,-0.25,12.6888,10.5,-0.25,12.9,10.3737,-0.25,13.6263],
// 3 15 10.7112 -0.25 12.963 10.3737 -0.25 13.6263 10.5 -0.25 12.9
  [3,15,10.7112,-0.25,12.963,10.3737,-0.25,13.6263,10.5,-0.25,12.9],
// 4 16 10.7112 -0.25 12.963 10.5 -0.25 12.9 10.337 -0.25 12.6888 10.2 -0.25 12
  [4,16,10.7112,-0.25,12.963,10.5,-0.25,12.9,10.337,-0.25,12.6888,10.2,-0.25,12],
// 4 16 11.4 -0.25 13.1 10.7112 -0.25 12.963 10.2 -0.25 12 12.0888 -0.25 12.963
  [4,16,11.4,-0.25,13.1,10.7112,-0.25,12.963,10.2,-0.25,12,12.0888,-0.25,12.963],
// 4 16 12.0888 -0.25 12.963 10.2 -0.25 12 10.337 -0.25 11.3112 12.6728 -0.25 12.5728
  [4,16,12.0888,-0.25,12.963,10.2,-0.25,12,10.337,-0.25,11.3112,12.6728,-0.25,12.5728],
// 4 16 12.6728 -0.25 12.5728 10.337 -0.25 11.3112 10.7272 -0.25 10.7272 13.063 -0.25 11.9888
  [4,16,12.6728,-0.25,12.5728,10.337,-0.25,11.3112,10.7272,-0.25,10.7272,13.063,-0.25,11.9888],
// 4 16 13.063 -0.25 11.9888 10.7272 -0.25 10.7272 11.3112 -0.25 10.337 13.2 -0.25 11.3
  [4,16,13.063,-0.25,11.9888,10.7272,-0.25,10.7272,11.3112,-0.25,10.337,13.2,-0.25,11.3],
// 4 16 13.2 -0.25 11.3 11.3112 -0.25 10.337 12 -0.25 10.2 13.063 -0.25 10.6112
  [4,16,13.2,-0.25,11.3,11.3112,-0.25,10.337,12,-0.25,10.2,13.063,-0.25,10.6112],
// 3 16 12 -0.25 10.2 12.6888 -0.25 10.337 13.063 -0.25 10.6112
  [3,16,12,-0.25,10.2,12.6888,-0.25,10.337,13.063,-0.25,10.6112],
// 0 //
// 4 15 -14.4263 -0.25 13.6263 -14.0888 -0.25 12.963 -13.4 -0.25 13.1 -13.6802 -0.25 14.125
  [4,15,-14.4263,-0.25,13.6263,-14.0888,-0.25,12.963,-13.4,-0.25,13.1,-13.6802,-0.25,14.125],
// 4 15 -13.6802 -0.25 14.125 -13.4 -0.25 13.1 -12.7112 -0.25 12.963 -12.8 -0.25 14.3
  [4,15,-13.6802,-0.25,14.125,-13.4,-0.25,13.1,-12.7112,-0.25,12.963,-12.8,-0.25,14.3],
// 4 15 -12.8 -0.25 14.3 -12.7112 -0.25 12.963 -12.1272 -0.25 12.5728 -11.9198 -0.25 14.125
  [4,15,-12.8,-0.25,14.3,-12.7112,-0.25,12.963,-12.1272,-0.25,12.5728,-11.9198,-0.25,14.125],
// 4 15 -11.9198 -0.25 14.125 -12.1272 -0.25 12.5728 -11.737 -0.25 11.9888 -11.1737 -0.25 13.6263
  [4,15,-11.9198,-0.25,14.125,-12.1272,-0.25,12.5728,-11.737,-0.25,11.9888,-11.1737,-0.25,13.6263],
// 4 15 -10.675 -0.25 12.8802 -11.1737 -0.25 13.6263 -11.737 -0.25 11.9888 -10.5 -0.25 12
  [4,15,-10.675,-0.25,12.8802,-11.1737,-0.25,13.6263,-11.737,-0.25,11.9888,-10.5,-0.25,12],
// 4 15 -10.5 -0.25 12 -11.737 -0.25 11.9888 -11.6 -0.25 11.3 -10.675 -0.25 11.1198
  [4,15,-10.5,-0.25,12,-11.737,-0.25,11.9888,-11.6,-0.25,11.3,-10.675,-0.25,11.1198],
// 4 15 -10.675 -0.25 11.1198 -11.6 -0.25 11.3 -11.737 -0.25 10.6112 -11.1737 -0.25 10.3737
  [4,15,-10.675,-0.25,11.1198,-11.6,-0.25,11.3,-11.737,-0.25,10.6112,-11.1737,-0.25,10.3737],
// 4 15 -11.1737 -0.25 10.3737 -11.737 -0.25 10.6112 -12.1112 -0.25 10.337 -11.9198 -0.25 9.87503
  [4,15,-11.1737,-0.25,10.3737,-11.737,-0.25,10.6112,-12.1112,-0.25,10.337,-11.9198,-0.25,9.87503],
// 4 15 -11.9198 -0.25 9.87503 -12.1112 -0.25 10.337 -12.8 -0.25 10.2 -12.8 -0.25 9.7
  [4,15,-11.9198,-0.25,9.87503,-12.1112,-0.25,10.337,-12.8,-0.25,10.2,-12.8,-0.25,9.7],
// 4 15 -12.8 -0.25 9.7 -12.8 -0.25 10.2 -13.4888 -0.25 10.337 -13.6802 -0.25 9.87503
  [4,15,-12.8,-0.25,9.7,-12.8,-0.25,10.2,-13.4888,-0.25,10.337,-13.6802,-0.25,9.87503],
// 4 15 -13.6802 -0.25 9.87503 -13.4888 -0.25 10.337 -14.0728 -0.25 10.7272 -14.4263 -0.25 10.3737
  [4,15,-13.6802,-0.25,9.87503,-13.4888,-0.25,10.337,-14.0728,-0.25,10.7272,-14.4263,-0.25,10.3737],
// 4 15 -14.4263 -0.25 10.3737 -14.0728 -0.25 10.7272 -14.463 -0.25 11.3112 -14.925 -0.25 11.1198
  [4,15,-14.4263,-0.25,10.3737,-14.0728,-0.25,10.7272,-14.463,-0.25,11.3112,-14.925,-0.25,11.1198],
// 4 15 -14.925 -0.25 11.1198 -14.463 -0.25 11.3112 -14.6 -0.25 12 -15.1 -0.25 12
  [4,15,-14.925,-0.25,11.1198,-14.463,-0.25,11.3112,-14.6,-0.25,12,-15.1,-0.25,12],
// 4 15 -15.1 -0.25 12 -14.6 -0.25 12 -14.463 -0.25 12.6888 -14.925 -0.25 12.8802
  [4,15,-15.1,-0.25,12,-14.6,-0.25,12,-14.463,-0.25,12.6888,-14.925,-0.25,12.8802],
// 4 15 -14.925 -0.25 12.8802 -14.463 -0.25 12.6888 -14.3 -0.25 12.9 -14.4263 -0.25 13.6263
  [4,15,-14.925,-0.25,12.8802,-14.463,-0.25,12.6888,-14.3,-0.25,12.9,-14.4263,-0.25,13.6263],
// 3 15 -14.0888 -0.25 12.963 -14.4263 -0.25 13.6263 -14.3 -0.25 12.9
  [3,15,-14.0888,-0.25,12.963,-14.4263,-0.25,13.6263,-14.3,-0.25,12.9],
// 4 16 -14.0888 -0.25 12.963 -14.3 -0.25 12.9 -14.463 -0.25 12.6888 -14.6 -0.25 12
  [4,16,-14.0888,-0.25,12.963,-14.3,-0.25,12.9,-14.463,-0.25,12.6888,-14.6,-0.25,12],
// 4 16 -13.4 -0.25 13.1 -14.0888 -0.25 12.963 -14.6 -0.25 12 -12.7112 -0.25 12.963
  [4,16,-13.4,-0.25,13.1,-14.0888,-0.25,12.963,-14.6,-0.25,12,-12.7112,-0.25,12.963],
// 4 16 -12.7112 -0.25 12.963 -14.6 -0.25 12 -14.463 -0.25 11.3112 -12.1272 -0.25 12.5728
  [4,16,-12.7112,-0.25,12.963,-14.6,-0.25,12,-14.463,-0.25,11.3112,-12.1272,-0.25,12.5728],
// 4 16 -12.1272 -0.25 12.5728 -14.463 -0.25 11.3112 -14.0728 -0.25 10.7272 -11.737 -0.25 11.9888
  [4,16,-12.1272,-0.25,12.5728,-14.463,-0.25,11.3112,-14.0728,-0.25,10.7272,-11.737,-0.25,11.9888],
// 4 16 -11.737 -0.25 11.9888 -14.0728 -0.25 10.7272 -13.4888 -0.25 10.337 -11.6 -0.25 11.3
  [4,16,-11.737,-0.25,11.9888,-14.0728,-0.25,10.7272,-13.4888,-0.25,10.337,-11.6,-0.25,11.3],
// 4 16 -11.6 -0.25 11.3 -13.4888 -0.25 10.337 -12.8 -0.25 10.2 -11.737 -0.25 10.6112
  [4,16,-11.6,-0.25,11.3,-13.4888,-0.25,10.337,-12.8,-0.25,10.2,-11.737,-0.25,10.6112],
// 3 16 -12.8 -0.25 10.2 -12.1112 -0.25 10.337 -11.737 -0.25 10.6112
  [3,16,-12.8,-0.25,10.2,-12.1112,-0.25,10.337,-11.737,-0.25,10.6112],
// 0 //
// 4 15 10.0737 -0.25 -9.87367 10.4112 -0.25 -10.537 11.1 -0.25 -10.4 10.8198 -0.25 -9.37503
  [4,15,10.0737,-0.25,-9.87367,10.4112,-0.25,-10.537,11.1,-0.25,-10.4,10.8198,-0.25,-9.37503],
// 4 15 10.8198 -0.25 -9.37503 11.1 -0.25 -10.4 11.7888 -0.25 -10.537 11.7 -0.25 -9.2
  [4,15,10.8198,-0.25,-9.37503,11.1,-0.25,-10.4,11.7888,-0.25,-10.537,11.7,-0.25,-9.2],
// 4 15 11.7 -0.25 -9.2 11.7888 -0.25 -10.537 12.3728 -0.25 -10.9272 12.5802 -0.25 -9.37503
  [4,15,11.7,-0.25,-9.2,11.7888,-0.25,-10.537,12.3728,-0.25,-10.9272,12.5802,-0.25,-9.37503],
// 4 15 12.5802 -0.25 -9.37503 12.3728 -0.25 -10.9272 12.763 -0.25 -11.5112 13.3263 -0.25 -9.87367
  [4,15,12.5802,-0.25,-9.37503,12.3728,-0.25,-10.9272,12.763,-0.25,-11.5112,13.3263,-0.25,-9.87367],
// 4 15 13.825 -0.25 -10.6198 13.3263 -0.25 -9.87367 12.763 -0.25 -11.5112 14 -0.25 -11.5
  [4,15,13.825,-0.25,-10.6198,13.3263,-0.25,-9.87367,12.763,-0.25,-11.5112,14,-0.25,-11.5],
// 4 15 14 -0.25 -11.5 12.763 -0.25 -11.5112 12.9 -0.25 -12.2 13.825 -0.25 -12.3802
  [4,15,14,-0.25,-11.5,12.763,-0.25,-11.5112,12.9,-0.25,-12.2,13.825,-0.25,-12.3802],
// 4 15 13.825 -0.25 -12.3802 12.9 -0.25 -12.2 12.763 -0.25 -12.8888 13.3263 -0.25 -13.1263
  [4,15,13.825,-0.25,-12.3802,12.9,-0.25,-12.2,12.763,-0.25,-12.8888,13.3263,-0.25,-13.1263],
// 4 15 13.3263 -0.25 -13.1263 12.763 -0.25 -12.8888 12.3888 -0.25 -13.163 12.5802 -0.25 -13.625
  [4,15,13.3263,-0.25,-13.1263,12.763,-0.25,-12.8888,12.3888,-0.25,-13.163,12.5802,-0.25,-13.625],
// 4 15 12.5802 -0.25 -13.625 12.3888 -0.25 -13.163 11.7 -0.25 -13.3 11.7 -0.25 -13.8
  [4,15,12.5802,-0.25,-13.625,12.3888,-0.25,-13.163,11.7,-0.25,-13.3,11.7,-0.25,-13.8],
// 4 15 11.7 -0.25 -13.8 11.7 -0.25 -13.3 11.0112 -0.25 -13.163 10.8198 -0.25 -13.625
  [4,15,11.7,-0.25,-13.8,11.7,-0.25,-13.3,11.0112,-0.25,-13.163,10.8198,-0.25,-13.625],
// 4 15 10.8198 -0.25 -13.625 11.0112 -0.25 -13.163 10.4272 -0.25 -12.7728 10.0737 -0.25 -13.1263
  [4,15,10.8198,-0.25,-13.625,11.0112,-0.25,-13.163,10.4272,-0.25,-12.7728,10.0737,-0.25,-13.1263],
// 4 15 10.0737 -0.25 -13.1263 10.4272 -0.25 -12.7728 10.037 -0.25 -12.1888 9.57503 -0.25 -12.3802
  [4,15,10.0737,-0.25,-13.1263,10.4272,-0.25,-12.7728,10.037,-0.25,-12.1888,9.57503,-0.25,-12.3802],
// 4 15 9.57503 -0.25 -12.3802 10.037 -0.25 -12.1888 9.9 -0.25 -11.5 9.4 -0.25 -11.5
  [4,15,9.57503,-0.25,-12.3802,10.037,-0.25,-12.1888,9.9,-0.25,-11.5,9.4,-0.25,-11.5],
// 4 15 9.4 -0.25 -11.5 9.9 -0.25 -11.5 10.037 -0.25 -10.8112 9.57503 -0.25 -10.6198
  [4,15,9.4,-0.25,-11.5,9.9,-0.25,-11.5,10.037,-0.25,-10.8112,9.57503,-0.25,-10.6198],
// 4 15 9.57503 -0.25 -10.6198 10.037 -0.25 -10.8112 10.2 -0.25 -10.6 10.0737 -0.25 -9.87367
  [4,15,9.57503,-0.25,-10.6198,10.037,-0.25,-10.8112,10.2,-0.25,-10.6,10.0737,-0.25,-9.87367],
// 3 15 10.4112 -0.25 -10.537 10.0737 -0.25 -9.87367 10.2 -0.25 -10.6
  [3,15,10.4112,-0.25,-10.537,10.0737,-0.25,-9.87367,10.2,-0.25,-10.6],
// 4 16 10.4112 -0.25 -10.537 10.2 -0.25 -10.6 10.037 -0.25 -10.8112 9.9 -0.25 -11.5
  [4,16,10.4112,-0.25,-10.537,10.2,-0.25,-10.6,10.037,-0.25,-10.8112,9.9,-0.25,-11.5],
// 4 16 11.1 -0.25 -10.4 10.4112 -0.25 -10.537 9.9 -0.25 -11.5 11.7888 -0.25 -10.537
  [4,16,11.1,-0.25,-10.4,10.4112,-0.25,-10.537,9.9,-0.25,-11.5,11.7888,-0.25,-10.537],
// 4 16 11.7888 -0.25 -10.537 9.9 -0.25 -11.5 10.037 -0.25 -12.1888 12.3728 -0.25 -10.9272
  [4,16,11.7888,-0.25,-10.537,9.9,-0.25,-11.5,10.037,-0.25,-12.1888,12.3728,-0.25,-10.9272],
// 4 16 12.3728 -0.25 -10.9272 10.037 -0.25 -12.1888 10.4272 -0.25 -12.7728 12.763 -0.25 -11.5112
  [4,16,12.3728,-0.25,-10.9272,10.037,-0.25,-12.1888,10.4272,-0.25,-12.7728,12.763,-0.25,-11.5112],
// 4 16 12.763 -0.25 -11.5112 10.4272 -0.25 -12.7728 11.0112 -0.25 -13.163 12.9 -0.25 -12.2
  [4,16,12.763,-0.25,-11.5112,10.4272,-0.25,-12.7728,11.0112,-0.25,-13.163,12.9,-0.25,-12.2],
// 4 16 12.9 -0.25 -12.2 11.0112 -0.25 -13.163 11.7 -0.25 -13.3 12.763 -0.25 -12.8888
  [4,16,12.9,-0.25,-12.2,11.0112,-0.25,-13.163,11.7,-0.25,-13.3,12.763,-0.25,-12.8888],
// 3 16 11.7 -0.25 -13.3 12.3888 -0.25 -13.163 12.763 -0.25 -12.8888
  [3,16,11.7,-0.25,-13.3,12.3888,-0.25,-13.163,12.763,-0.25,-12.8888],
// 0 //
// 4 15 -13.8263 -0.25 -9.87367 -13.4888 -0.25 -10.537 -12.8 -0.25 -10.4 -13.0802 -0.25 -9.37503
  [4,15,-13.8263,-0.25,-9.87367,-13.4888,-0.25,-10.537,-12.8,-0.25,-10.4,-13.0802,-0.25,-9.37503],
// 4 15 -13.0802 -0.25 -9.37503 -12.8 -0.25 -10.4 -12.1112 -0.25 -10.537 -12.2 -0.25 -9.2
  [4,15,-13.0802,-0.25,-9.37503,-12.8,-0.25,-10.4,-12.1112,-0.25,-10.537,-12.2,-0.25,-9.2],
// 4 15 -12.2 -0.25 -9.2 -12.1112 -0.25 -10.537 -11.5272 -0.25 -10.9272 -11.3198 -0.25 -9.37503
  [4,15,-12.2,-0.25,-9.2,-12.1112,-0.25,-10.537,-11.5272,-0.25,-10.9272,-11.3198,-0.25,-9.37503],
// 4 15 -11.3198 -0.25 -9.37503 -11.5272 -0.25 -10.9272 -11.137 -0.25 -11.5112 -10.5737 -0.25 -9.87367
  [4,15,-11.3198,-0.25,-9.37503,-11.5272,-0.25,-10.9272,-11.137,-0.25,-11.5112,-10.5737,-0.25,-9.87367],
// 4 15 -10.075 -0.25 -10.6198 -10.5737 -0.25 -9.87367 -11.137 -0.25 -11.5112 -9.9 -0.25 -11.5
  [4,15,-10.075,-0.25,-10.6198,-10.5737,-0.25,-9.87367,-11.137,-0.25,-11.5112,-9.9,-0.25,-11.5],
// 4 15 -9.9 -0.25 -11.5 -11.137 -0.25 -11.5112 -11 -0.25 -12.2 -10.075 -0.25 -12.3802
  [4,15,-9.9,-0.25,-11.5,-11.137,-0.25,-11.5112,-11,-0.25,-12.2,-10.075,-0.25,-12.3802],
// 4 15 -10.075 -0.25 -12.3802 -11 -0.25 -12.2 -11.137 -0.25 -12.8888 -10.5737 -0.25 -13.1263
  [4,15,-10.075,-0.25,-12.3802,-11,-0.25,-12.2,-11.137,-0.25,-12.8888,-10.5737,-0.25,-13.1263],
// 4 15 -10.5737 -0.25 -13.1263 -11.137 -0.25 -12.8888 -11.5112 -0.25 -13.163 -11.3198 -0.25 -13.625
  [4,15,-10.5737,-0.25,-13.1263,-11.137,-0.25,-12.8888,-11.5112,-0.25,-13.163,-11.3198,-0.25,-13.625],
// 4 15 -11.3198 -0.25 -13.625 -11.5112 -0.25 -13.163 -12.2 -0.25 -13.3 -12.2 -0.25 -13.8
  [4,15,-11.3198,-0.25,-13.625,-11.5112,-0.25,-13.163,-12.2,-0.25,-13.3,-12.2,-0.25,-13.8],
// 4 15 -12.2 -0.25 -13.8 -12.2 -0.25 -13.3 -12.8888 -0.25 -13.163 -13.0802 -0.25 -13.625
  [4,15,-12.2,-0.25,-13.8,-12.2,-0.25,-13.3,-12.8888,-0.25,-13.163,-13.0802,-0.25,-13.625],
// 4 15 -13.0802 -0.25 -13.625 -12.8888 -0.25 -13.163 -13.4728 -0.25 -12.7728 -13.8263 -0.25 -13.1263
  [4,15,-13.0802,-0.25,-13.625,-12.8888,-0.25,-13.163,-13.4728,-0.25,-12.7728,-13.8263,-0.25,-13.1263],
// 4 15 -13.8263 -0.25 -13.1263 -13.4728 -0.25 -12.7728 -13.863 -0.25 -12.1888 -14.325 -0.25 -12.3802
  [4,15,-13.8263,-0.25,-13.1263,-13.4728,-0.25,-12.7728,-13.863,-0.25,-12.1888,-14.325,-0.25,-12.3802],
// 4 15 -14.325 -0.25 -12.3802 -13.863 -0.25 -12.1888 -14 -0.25 -11.5 -14.5 -0.25 -11.5
  [4,15,-14.325,-0.25,-12.3802,-13.863,-0.25,-12.1888,-14,-0.25,-11.5,-14.5,-0.25,-11.5],
// 4 15 -14.5 -0.25 -11.5 -14 -0.25 -11.5 -13.863 -0.25 -10.8112 -14.325 -0.25 -10.6198
  [4,15,-14.5,-0.25,-11.5,-14,-0.25,-11.5,-13.863,-0.25,-10.8112,-14.325,-0.25,-10.6198],
// 4 15 -14.325 -0.25 -10.6198 -13.863 -0.25 -10.8112 -13.7 -0.25 -10.6 -13.8263 -0.25 -9.87367
  [4,15,-14.325,-0.25,-10.6198,-13.863,-0.25,-10.8112,-13.7,-0.25,-10.6,-13.8263,-0.25,-9.87367],
// 3 15 -13.4888 -0.25 -10.537 -13.8263 -0.25 -9.87367 -13.7 -0.25 -10.6
  [3,15,-13.4888,-0.25,-10.537,-13.8263,-0.25,-9.87367,-13.7,-0.25,-10.6],
// 4 16 -13.4888 -0.25 -10.537 -13.7 -0.25 -10.6 -13.863 -0.25 -10.8112 -14 -0.25 -11.5
  [4,16,-13.4888,-0.25,-10.537,-13.7,-0.25,-10.6,-13.863,-0.25,-10.8112,-14,-0.25,-11.5],
// 4 16 -12.8 -0.25 -10.4 -13.4888 -0.25 -10.537 -14 -0.25 -11.5 -12.1112 -0.25 -10.537
  [4,16,-12.8,-0.25,-10.4,-13.4888,-0.25,-10.537,-14,-0.25,-11.5,-12.1112,-0.25,-10.537],
// 4 16 -12.1112 -0.25 -10.537 -14 -0.25 -11.5 -13.863 -0.25 -12.1888 -11.5272 -0.25 -10.9272
  [4,16,-12.1112,-0.25,-10.537,-14,-0.25,-11.5,-13.863,-0.25,-12.1888,-11.5272,-0.25,-10.9272],
// 4 16 -11.5272 -0.25 -10.9272 -13.863 -0.25 -12.1888 -13.4728 -0.25 -12.7728 -11.137 -0.25 -11.5112
  [4,16,-11.5272,-0.25,-10.9272,-13.863,-0.25,-12.1888,-13.4728,-0.25,-12.7728,-11.137,-0.25,-11.5112],
// 4 16 -11.137 -0.25 -11.5112 -13.4728 -0.25 -12.7728 -12.8888 -0.25 -13.163 -11 -0.25 -12.2
  [4,16,-11.137,-0.25,-11.5112,-13.4728,-0.25,-12.7728,-12.8888,-0.25,-13.163,-11,-0.25,-12.2],
// 4 16 -11 -0.25 -12.2 -12.8888 -0.25 -13.163 -12.2 -0.25 -13.3 -11.137 -0.25 -12.8888
  [4,16,-11,-0.25,-12.2,-12.8888,-0.25,-13.163,-12.2,-0.25,-13.3,-11.137,-0.25,-12.8888],
// 3 16 -12.2 -0.25 -13.3 -11.5112 -0.25 -13.163 -11.137 -0.25 -12.8888
  [3,16,-12.2,-0.25,-13.3,-11.5112,-0.25,-13.163,-11.137,-0.25,-12.8888],
];
makepoly(ldraw_lib__4544258l(), line=0.2);
